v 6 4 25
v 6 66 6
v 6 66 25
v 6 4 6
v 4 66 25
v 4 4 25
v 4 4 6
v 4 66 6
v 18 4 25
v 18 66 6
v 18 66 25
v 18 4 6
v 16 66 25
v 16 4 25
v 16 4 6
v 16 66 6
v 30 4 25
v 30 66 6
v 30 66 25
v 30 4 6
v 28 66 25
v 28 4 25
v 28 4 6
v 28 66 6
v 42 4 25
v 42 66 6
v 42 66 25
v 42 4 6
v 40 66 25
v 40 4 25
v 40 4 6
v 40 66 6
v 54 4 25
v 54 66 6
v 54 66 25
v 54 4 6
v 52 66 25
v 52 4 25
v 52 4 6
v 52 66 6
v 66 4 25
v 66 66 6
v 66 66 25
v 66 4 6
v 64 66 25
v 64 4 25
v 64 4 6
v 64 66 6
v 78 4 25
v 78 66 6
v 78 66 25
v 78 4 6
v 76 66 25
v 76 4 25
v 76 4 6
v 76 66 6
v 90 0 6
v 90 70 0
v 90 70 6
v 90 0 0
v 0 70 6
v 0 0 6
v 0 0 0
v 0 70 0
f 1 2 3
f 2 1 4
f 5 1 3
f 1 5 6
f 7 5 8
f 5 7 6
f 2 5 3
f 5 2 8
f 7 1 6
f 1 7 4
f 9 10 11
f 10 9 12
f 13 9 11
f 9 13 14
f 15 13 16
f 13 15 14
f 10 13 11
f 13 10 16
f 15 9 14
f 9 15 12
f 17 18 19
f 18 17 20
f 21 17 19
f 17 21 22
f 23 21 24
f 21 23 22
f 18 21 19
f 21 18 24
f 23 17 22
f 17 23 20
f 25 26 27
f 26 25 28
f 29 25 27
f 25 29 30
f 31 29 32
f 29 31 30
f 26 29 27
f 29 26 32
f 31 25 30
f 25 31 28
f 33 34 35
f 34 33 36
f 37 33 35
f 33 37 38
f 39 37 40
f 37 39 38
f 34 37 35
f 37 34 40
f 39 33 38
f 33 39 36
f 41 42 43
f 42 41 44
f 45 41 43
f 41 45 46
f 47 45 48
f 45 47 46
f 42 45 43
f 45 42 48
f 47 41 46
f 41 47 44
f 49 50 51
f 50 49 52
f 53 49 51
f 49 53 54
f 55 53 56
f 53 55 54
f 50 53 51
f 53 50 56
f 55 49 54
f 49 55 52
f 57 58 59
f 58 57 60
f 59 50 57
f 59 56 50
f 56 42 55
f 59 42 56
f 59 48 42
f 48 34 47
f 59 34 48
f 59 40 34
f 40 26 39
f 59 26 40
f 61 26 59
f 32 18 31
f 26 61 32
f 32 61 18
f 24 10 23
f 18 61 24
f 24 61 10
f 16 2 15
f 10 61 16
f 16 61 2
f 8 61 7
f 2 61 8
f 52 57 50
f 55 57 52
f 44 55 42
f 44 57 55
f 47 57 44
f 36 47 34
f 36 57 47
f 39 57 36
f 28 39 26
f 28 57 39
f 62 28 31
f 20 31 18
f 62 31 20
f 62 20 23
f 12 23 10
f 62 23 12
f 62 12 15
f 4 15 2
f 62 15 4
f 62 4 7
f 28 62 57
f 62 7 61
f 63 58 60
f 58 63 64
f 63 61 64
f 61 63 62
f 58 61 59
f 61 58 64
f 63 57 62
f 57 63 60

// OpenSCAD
$fn = 32;

// ----------------------------------------------------------------------
// Heatsink: uniform fin block
// ----------------------------------------------------------------------

// --- parameters (mm) ---
base_l = 90;              // base length, X
base_w = 70;              // base width, Y
base_t = 6;               // base plate thickness
fin_h = 20;               // fin height above the base
fin_t = 2;                // fin thickness
edge = 4;                 // margin from the base ends
pitch = 12;               // fin pitch

n_fins = floor((base_l - 2 * edge - fin_t) / pitch) + 1;  // fin count
total_h = base_t + fin_h - 1;  // overall height

union() {
  cube([base_l, base_w, base_t]);
  for (i = [0 : n_fins - 1])
    translate([edge + i * pitch, edge, base_t - 1])
      cube([fin_t, base_w - 2 * edge, fin_h]);
}
